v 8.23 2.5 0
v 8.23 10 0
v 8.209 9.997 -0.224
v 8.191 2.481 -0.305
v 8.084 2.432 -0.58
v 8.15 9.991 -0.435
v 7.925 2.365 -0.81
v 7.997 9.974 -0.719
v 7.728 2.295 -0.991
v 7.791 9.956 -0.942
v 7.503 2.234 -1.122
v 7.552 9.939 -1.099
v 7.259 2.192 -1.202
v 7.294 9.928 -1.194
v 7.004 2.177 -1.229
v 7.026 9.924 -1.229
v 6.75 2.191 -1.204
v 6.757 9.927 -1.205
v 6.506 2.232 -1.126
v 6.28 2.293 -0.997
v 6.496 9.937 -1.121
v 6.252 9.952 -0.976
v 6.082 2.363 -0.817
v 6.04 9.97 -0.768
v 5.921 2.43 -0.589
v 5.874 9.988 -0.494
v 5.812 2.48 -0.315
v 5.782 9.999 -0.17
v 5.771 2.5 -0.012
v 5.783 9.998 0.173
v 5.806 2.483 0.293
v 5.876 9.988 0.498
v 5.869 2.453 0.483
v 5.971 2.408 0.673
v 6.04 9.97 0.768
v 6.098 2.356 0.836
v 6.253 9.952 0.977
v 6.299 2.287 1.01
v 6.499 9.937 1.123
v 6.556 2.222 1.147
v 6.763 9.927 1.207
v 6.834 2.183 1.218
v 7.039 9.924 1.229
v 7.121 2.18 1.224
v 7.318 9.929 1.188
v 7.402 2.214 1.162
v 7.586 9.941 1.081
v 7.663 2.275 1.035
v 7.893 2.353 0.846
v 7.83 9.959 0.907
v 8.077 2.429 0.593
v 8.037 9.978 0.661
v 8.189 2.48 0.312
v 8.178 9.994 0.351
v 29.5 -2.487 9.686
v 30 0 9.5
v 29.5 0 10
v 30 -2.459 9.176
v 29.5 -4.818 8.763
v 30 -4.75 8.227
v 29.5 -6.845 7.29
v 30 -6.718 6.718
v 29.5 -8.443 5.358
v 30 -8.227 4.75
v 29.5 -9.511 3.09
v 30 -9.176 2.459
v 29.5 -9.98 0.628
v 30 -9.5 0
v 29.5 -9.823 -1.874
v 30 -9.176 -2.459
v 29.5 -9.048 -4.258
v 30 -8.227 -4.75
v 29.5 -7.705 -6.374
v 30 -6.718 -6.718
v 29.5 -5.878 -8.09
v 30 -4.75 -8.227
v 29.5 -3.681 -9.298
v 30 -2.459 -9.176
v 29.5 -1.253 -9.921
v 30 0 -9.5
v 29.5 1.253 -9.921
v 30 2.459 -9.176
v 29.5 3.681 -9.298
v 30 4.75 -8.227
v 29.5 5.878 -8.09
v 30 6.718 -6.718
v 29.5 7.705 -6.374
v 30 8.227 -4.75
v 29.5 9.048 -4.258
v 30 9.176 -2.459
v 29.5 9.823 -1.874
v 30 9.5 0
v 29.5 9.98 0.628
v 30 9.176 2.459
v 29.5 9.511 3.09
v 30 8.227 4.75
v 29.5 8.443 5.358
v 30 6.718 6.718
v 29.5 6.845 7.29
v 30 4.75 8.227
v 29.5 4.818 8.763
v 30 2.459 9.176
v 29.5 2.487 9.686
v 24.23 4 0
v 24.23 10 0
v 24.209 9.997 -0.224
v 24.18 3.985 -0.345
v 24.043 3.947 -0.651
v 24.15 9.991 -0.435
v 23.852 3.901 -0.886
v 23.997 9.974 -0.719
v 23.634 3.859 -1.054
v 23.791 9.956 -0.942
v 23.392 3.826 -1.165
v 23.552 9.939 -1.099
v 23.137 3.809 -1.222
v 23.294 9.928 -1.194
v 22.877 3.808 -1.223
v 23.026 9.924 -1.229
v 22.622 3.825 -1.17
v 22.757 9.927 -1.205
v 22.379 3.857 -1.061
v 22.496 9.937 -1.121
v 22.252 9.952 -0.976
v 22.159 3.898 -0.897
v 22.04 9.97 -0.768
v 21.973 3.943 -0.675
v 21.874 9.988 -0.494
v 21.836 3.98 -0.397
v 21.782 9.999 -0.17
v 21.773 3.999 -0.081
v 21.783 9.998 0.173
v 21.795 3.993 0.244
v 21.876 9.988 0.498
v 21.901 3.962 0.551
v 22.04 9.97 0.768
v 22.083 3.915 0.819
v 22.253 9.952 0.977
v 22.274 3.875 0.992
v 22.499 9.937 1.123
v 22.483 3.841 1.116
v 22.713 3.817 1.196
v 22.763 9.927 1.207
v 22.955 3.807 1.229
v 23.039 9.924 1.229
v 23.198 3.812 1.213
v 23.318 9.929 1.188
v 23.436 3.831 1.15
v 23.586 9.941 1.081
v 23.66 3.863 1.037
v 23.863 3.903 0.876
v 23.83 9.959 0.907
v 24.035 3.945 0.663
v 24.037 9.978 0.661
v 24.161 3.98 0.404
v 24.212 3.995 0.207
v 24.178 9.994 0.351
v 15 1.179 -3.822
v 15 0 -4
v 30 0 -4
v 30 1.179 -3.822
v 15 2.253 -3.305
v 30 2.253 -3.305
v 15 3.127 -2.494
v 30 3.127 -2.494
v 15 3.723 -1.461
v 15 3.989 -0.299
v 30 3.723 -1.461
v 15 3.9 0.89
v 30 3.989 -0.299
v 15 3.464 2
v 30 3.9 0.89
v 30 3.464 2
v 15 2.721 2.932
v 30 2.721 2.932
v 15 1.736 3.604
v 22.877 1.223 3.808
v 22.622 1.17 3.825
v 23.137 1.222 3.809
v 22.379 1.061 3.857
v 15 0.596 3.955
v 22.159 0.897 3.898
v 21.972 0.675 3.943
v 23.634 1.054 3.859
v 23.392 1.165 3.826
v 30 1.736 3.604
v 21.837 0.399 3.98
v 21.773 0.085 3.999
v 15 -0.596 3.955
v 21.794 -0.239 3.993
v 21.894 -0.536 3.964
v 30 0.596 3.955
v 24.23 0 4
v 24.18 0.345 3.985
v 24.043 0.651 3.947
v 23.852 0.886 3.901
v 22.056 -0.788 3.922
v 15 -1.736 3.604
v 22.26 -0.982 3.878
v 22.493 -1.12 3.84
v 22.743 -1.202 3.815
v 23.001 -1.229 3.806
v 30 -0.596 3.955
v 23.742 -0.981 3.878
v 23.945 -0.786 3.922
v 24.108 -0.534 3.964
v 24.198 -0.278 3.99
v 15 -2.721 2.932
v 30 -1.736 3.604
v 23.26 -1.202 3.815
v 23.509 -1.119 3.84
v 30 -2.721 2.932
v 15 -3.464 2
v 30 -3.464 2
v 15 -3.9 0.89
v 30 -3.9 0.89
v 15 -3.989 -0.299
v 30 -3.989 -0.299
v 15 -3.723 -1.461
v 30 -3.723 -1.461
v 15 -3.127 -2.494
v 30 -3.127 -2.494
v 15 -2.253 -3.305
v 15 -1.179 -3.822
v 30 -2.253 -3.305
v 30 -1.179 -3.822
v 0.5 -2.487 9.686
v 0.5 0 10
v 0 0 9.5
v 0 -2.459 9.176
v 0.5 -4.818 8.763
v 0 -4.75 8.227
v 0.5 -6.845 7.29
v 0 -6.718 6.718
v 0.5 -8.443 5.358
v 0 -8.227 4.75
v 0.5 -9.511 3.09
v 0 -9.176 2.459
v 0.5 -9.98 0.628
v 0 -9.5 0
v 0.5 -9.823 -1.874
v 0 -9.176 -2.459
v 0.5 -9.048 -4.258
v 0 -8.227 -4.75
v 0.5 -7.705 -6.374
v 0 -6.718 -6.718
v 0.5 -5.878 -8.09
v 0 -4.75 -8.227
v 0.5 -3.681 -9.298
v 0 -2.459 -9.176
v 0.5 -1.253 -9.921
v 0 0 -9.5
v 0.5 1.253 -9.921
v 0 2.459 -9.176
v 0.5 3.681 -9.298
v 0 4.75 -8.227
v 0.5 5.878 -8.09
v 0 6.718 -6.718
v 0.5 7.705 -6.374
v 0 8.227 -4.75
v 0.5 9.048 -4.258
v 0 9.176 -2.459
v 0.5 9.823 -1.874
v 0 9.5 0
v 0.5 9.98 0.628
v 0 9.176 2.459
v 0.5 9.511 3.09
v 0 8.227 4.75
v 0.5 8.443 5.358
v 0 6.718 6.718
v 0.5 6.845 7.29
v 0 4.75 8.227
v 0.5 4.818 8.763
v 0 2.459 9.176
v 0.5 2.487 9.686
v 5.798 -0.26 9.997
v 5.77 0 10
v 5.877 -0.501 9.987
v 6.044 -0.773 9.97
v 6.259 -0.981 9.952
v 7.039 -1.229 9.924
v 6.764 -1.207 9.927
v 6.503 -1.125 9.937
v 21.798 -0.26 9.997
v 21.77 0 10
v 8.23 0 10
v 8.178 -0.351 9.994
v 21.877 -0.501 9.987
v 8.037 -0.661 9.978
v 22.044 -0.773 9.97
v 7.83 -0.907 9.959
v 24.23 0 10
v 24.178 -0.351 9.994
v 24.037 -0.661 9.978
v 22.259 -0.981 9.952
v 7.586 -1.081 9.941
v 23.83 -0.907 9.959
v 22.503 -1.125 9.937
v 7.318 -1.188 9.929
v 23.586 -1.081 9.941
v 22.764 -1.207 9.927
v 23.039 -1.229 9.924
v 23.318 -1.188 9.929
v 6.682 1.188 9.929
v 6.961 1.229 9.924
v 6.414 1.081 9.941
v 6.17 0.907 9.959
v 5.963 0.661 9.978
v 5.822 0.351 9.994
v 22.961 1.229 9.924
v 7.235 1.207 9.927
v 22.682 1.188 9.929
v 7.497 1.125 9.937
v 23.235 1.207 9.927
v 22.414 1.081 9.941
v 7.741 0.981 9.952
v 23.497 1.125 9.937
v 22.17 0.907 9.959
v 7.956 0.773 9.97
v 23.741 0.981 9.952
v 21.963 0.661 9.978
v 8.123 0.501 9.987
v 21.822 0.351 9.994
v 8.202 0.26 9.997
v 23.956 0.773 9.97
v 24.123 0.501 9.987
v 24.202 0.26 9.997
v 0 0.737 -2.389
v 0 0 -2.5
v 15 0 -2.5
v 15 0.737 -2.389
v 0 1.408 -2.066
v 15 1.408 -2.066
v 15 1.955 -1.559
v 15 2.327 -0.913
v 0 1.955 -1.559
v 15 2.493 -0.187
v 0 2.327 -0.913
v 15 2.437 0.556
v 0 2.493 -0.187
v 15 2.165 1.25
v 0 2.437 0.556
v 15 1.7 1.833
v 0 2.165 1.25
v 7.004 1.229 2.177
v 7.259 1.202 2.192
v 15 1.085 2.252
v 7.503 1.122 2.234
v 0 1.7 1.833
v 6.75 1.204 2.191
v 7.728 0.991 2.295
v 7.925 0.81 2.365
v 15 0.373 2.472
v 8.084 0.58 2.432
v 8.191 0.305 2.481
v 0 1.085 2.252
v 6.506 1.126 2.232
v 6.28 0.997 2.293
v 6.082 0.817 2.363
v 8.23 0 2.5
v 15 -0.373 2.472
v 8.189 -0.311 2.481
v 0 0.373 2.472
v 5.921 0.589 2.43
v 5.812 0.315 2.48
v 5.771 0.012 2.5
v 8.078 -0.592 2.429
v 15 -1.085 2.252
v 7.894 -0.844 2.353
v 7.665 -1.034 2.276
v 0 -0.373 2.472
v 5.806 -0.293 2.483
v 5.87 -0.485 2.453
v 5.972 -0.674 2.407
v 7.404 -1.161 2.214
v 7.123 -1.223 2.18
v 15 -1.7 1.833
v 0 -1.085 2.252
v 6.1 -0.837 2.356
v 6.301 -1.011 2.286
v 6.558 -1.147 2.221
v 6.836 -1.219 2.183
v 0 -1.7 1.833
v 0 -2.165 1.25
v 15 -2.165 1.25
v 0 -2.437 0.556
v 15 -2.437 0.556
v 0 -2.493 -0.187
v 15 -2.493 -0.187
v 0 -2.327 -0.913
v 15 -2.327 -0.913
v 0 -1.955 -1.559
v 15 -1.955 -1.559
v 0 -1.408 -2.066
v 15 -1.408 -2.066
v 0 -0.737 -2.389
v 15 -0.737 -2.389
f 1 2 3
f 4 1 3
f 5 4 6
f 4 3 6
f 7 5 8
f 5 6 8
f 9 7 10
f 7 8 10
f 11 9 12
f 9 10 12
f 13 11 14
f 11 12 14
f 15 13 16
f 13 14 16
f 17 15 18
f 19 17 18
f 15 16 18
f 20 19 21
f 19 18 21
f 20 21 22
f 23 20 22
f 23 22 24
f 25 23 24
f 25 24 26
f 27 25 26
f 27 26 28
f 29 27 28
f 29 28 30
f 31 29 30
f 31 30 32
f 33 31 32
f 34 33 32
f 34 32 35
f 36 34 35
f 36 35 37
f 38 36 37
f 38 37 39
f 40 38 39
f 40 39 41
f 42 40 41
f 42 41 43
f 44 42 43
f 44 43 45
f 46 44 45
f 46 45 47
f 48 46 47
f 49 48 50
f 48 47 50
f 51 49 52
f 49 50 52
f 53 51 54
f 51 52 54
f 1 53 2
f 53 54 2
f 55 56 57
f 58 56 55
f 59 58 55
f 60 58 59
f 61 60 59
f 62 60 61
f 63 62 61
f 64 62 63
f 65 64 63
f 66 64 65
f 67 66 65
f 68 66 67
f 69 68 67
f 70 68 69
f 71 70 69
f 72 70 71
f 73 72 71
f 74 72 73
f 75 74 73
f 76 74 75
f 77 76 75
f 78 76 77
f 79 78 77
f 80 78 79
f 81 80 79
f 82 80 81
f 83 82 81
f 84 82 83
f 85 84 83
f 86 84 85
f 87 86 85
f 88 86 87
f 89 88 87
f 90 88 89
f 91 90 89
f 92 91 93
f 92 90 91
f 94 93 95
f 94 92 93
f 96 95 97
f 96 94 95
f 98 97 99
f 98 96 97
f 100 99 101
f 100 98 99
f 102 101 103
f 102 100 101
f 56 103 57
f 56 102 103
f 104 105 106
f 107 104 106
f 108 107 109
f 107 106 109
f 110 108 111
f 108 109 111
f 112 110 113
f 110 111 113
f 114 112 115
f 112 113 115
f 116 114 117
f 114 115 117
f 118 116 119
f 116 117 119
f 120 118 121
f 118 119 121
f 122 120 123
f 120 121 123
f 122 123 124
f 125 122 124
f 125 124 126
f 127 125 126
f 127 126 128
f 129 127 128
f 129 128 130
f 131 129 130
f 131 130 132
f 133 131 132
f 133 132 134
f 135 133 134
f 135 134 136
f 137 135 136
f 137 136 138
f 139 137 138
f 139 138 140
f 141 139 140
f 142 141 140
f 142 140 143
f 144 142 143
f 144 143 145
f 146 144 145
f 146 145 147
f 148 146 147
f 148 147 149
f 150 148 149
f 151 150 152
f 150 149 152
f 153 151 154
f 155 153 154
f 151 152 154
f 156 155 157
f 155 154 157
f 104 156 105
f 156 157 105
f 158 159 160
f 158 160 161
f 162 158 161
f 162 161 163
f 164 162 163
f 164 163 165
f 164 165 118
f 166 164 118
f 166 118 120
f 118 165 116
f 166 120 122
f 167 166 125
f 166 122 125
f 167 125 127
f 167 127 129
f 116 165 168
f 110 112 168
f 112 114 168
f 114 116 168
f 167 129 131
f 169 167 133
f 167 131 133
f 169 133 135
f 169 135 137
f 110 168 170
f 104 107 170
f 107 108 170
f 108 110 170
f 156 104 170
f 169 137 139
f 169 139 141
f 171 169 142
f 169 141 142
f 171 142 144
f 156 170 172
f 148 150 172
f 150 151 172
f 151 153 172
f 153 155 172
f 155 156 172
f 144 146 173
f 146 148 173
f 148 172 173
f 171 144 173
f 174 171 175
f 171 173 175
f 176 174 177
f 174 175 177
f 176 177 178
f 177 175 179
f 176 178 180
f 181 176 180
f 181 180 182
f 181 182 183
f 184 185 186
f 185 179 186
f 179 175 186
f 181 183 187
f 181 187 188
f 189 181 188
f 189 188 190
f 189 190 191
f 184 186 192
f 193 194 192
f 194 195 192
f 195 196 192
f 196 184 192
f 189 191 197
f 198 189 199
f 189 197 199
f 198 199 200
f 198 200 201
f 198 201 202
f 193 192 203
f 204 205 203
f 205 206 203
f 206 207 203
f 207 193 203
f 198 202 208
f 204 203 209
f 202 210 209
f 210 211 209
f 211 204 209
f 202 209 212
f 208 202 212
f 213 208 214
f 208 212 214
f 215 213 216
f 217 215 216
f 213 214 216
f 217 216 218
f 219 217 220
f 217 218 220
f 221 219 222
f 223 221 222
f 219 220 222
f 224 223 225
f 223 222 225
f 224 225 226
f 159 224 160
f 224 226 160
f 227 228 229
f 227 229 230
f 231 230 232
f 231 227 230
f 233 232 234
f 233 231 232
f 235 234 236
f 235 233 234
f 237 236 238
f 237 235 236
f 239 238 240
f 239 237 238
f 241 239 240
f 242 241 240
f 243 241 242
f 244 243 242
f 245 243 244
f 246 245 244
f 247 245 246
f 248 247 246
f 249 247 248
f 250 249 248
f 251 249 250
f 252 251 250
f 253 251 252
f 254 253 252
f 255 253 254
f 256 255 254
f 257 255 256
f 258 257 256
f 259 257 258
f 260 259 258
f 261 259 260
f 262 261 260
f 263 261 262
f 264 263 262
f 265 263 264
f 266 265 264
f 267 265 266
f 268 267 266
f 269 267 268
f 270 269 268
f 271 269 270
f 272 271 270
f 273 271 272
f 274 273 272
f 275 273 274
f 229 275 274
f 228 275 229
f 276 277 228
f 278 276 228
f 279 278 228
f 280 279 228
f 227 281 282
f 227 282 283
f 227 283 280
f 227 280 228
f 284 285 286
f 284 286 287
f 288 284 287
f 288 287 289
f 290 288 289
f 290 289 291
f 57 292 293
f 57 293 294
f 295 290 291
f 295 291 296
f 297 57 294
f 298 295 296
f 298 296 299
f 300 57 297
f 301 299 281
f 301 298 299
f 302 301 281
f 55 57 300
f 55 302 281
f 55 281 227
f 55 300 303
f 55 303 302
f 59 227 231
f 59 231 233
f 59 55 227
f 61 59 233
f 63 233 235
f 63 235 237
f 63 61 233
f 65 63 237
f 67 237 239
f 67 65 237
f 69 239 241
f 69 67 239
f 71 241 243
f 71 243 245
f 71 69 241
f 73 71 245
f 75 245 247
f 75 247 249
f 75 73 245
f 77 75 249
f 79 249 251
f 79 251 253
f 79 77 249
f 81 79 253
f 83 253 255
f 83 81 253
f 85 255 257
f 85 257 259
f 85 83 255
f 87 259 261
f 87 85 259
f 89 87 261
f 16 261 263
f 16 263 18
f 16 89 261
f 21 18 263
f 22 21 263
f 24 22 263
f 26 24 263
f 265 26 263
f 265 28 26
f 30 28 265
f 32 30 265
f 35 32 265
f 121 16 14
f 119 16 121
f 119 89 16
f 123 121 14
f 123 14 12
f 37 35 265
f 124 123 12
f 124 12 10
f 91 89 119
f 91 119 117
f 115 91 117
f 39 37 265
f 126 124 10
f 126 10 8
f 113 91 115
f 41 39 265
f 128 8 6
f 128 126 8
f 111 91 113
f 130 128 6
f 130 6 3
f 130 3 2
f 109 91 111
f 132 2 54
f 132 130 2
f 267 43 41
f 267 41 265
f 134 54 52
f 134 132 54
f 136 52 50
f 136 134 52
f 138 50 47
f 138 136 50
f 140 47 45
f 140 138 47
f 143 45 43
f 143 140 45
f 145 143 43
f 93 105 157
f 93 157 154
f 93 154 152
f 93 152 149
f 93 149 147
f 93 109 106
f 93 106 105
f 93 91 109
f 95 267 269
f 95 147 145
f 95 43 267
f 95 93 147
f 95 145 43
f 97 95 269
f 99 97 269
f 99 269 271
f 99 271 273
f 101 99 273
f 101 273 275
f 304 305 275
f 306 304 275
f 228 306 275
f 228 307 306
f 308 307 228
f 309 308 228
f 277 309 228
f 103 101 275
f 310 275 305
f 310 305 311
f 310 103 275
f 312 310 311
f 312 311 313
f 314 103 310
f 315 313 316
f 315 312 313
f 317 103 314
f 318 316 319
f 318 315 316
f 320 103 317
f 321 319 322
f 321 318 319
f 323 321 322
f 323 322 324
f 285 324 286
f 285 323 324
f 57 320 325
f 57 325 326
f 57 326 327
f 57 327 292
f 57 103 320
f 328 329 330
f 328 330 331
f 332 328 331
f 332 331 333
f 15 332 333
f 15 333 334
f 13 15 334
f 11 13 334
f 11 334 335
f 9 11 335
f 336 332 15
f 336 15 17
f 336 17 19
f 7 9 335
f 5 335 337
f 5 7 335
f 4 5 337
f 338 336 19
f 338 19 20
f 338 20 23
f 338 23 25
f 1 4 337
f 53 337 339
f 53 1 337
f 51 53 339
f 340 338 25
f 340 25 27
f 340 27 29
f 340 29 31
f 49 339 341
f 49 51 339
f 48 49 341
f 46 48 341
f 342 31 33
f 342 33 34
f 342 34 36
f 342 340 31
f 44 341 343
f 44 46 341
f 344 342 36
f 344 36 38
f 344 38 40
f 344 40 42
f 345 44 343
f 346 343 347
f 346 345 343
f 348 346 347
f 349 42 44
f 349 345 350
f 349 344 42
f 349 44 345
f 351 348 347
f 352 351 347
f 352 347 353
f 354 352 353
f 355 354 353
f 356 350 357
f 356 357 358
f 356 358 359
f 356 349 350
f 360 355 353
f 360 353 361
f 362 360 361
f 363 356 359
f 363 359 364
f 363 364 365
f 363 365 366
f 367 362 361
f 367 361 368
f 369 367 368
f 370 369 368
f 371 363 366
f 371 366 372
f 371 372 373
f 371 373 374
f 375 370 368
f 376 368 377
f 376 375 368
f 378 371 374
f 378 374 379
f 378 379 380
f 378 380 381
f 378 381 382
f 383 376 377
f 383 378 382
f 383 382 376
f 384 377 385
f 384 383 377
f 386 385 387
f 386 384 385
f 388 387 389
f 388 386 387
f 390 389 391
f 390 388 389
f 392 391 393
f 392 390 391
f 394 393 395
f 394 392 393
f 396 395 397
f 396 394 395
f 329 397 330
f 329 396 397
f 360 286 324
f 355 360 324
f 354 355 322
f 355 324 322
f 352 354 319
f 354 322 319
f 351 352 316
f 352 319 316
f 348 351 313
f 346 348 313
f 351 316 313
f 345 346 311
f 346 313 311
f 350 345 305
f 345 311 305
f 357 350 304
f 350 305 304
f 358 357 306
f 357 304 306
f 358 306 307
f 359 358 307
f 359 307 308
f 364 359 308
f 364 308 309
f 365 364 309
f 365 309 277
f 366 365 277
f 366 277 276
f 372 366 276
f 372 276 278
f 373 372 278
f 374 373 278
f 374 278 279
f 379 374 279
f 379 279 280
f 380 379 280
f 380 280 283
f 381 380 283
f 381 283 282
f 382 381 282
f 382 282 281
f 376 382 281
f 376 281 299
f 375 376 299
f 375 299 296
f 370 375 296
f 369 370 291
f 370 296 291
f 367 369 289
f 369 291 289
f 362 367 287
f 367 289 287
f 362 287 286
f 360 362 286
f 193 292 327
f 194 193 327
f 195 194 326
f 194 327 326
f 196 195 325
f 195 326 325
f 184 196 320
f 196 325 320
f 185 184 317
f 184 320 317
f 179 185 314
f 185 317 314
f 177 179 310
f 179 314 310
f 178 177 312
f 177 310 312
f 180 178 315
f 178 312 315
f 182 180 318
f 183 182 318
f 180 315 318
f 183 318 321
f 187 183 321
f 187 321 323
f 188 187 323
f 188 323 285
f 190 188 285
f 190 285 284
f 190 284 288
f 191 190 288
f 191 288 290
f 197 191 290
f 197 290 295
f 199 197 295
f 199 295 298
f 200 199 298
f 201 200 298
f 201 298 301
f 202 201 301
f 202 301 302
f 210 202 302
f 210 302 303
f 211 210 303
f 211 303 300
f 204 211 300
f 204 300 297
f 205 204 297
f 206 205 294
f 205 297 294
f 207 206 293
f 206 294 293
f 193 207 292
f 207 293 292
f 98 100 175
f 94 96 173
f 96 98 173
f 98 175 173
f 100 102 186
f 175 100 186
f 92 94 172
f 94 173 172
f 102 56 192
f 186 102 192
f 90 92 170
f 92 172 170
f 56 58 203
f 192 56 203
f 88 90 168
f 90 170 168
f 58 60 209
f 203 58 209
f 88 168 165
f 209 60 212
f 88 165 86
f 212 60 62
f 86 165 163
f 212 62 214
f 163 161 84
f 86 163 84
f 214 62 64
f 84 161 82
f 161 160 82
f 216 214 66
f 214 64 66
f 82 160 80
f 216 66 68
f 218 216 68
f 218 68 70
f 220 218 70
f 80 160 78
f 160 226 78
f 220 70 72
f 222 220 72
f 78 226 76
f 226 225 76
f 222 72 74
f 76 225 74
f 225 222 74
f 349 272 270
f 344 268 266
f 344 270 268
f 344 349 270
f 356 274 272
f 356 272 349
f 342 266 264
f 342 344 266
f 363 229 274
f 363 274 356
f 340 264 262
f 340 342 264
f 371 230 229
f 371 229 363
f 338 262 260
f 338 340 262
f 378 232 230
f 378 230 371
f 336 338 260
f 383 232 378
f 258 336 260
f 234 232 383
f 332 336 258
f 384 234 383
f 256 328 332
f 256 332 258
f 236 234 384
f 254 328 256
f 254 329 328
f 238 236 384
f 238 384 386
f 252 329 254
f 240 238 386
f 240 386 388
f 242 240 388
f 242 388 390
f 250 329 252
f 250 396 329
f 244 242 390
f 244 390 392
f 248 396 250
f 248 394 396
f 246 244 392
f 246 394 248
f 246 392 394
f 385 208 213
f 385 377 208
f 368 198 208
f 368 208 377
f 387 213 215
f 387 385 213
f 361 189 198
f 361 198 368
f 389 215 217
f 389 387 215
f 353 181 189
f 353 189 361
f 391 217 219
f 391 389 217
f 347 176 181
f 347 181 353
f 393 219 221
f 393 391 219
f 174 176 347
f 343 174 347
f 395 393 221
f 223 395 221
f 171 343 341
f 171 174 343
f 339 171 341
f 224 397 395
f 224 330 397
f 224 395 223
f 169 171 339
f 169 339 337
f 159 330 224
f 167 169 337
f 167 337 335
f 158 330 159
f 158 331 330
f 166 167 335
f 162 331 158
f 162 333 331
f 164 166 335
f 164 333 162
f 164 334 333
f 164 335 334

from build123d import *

# Parameters (mm, degrees)
SKETCH1_W          = 30
SKETCH1_H          = 10
SKETCH2_R          = 2.5
CUT_EXTRUDE1_DEPTH = 15
SKETCH3_R          = 4
CUT_EXTRUDE2_DEPTH = 15
TAP1_REACH         = 39.417
TAP1_BORE_R        = 1.2295
TAP2_REACH         = 39.417
TAP2_BORE_R        = 1.2295
CHAMFER1_SIZE      = 0.5


with BuildPart() as part:
    # Sketch1 → Revolve1 (revolve)
    with BuildSketch(Plane.XY, mode=Mode.PRIVATE) as revolve1_sk:
        with Locations((15, 5)):
            Rectangle(SKETCH1_W, SKETCH1_H)
    revolve(revolve1_sk.sketch.rotate(Axis((0, 0, 0), (1, 0, 0)), 90), axis=Axis((0, 0, 0), (1, 0, 0)))

    # Sketch2 → Cut-Extrude1 (cut)
    with BuildSketch(Plane(origin=(0, 0, 0), x_dir=(0, 0, -1), z_dir=(1, 0, 0))):
        Circle(SKETCH2_R)
    extrude(amount=CUT_EXTRUDE1_DEPTH, mode=Mode.SUBTRACT)

    # Sketch3 → Cut-Extrude2 (cut)
    with BuildSketch(Plane(origin=(30, 0, 0), x_dir=(0, 0, -1), z_dir=(1, 0, 0))):
        Circle(SKETCH3_R)
    extrude(amount=-CUT_EXTRUDE2_DEPTH, mode=Mode.SUBTRACT)

    # Tap1 bore → Tap1 (cut, up to next)
    with BuildSketch(Plane.XY.offset(10), mode=Mode.PRIVATE) as tap1_sk1:
        with Locations((7, 0)):
            Circle(TAP1_BORE_R)
    tap1_tool1 = extrude(tap1_sk1.sketch, amount=-TAP1_REACH, mode=Mode.PRIVATE) & part.part
    # Tap1 bore → Tap1 (cut, up to next)
    with BuildSketch(Plane.XY.offset(10), mode=Mode.PRIVATE) as tap1_sk2:
        with Locations((23, 0)):
            Circle(TAP1_BORE_R)
    tap1_tool2 = extrude(tap1_sk2.sketch, amount=-TAP1_REACH, mode=Mode.PRIVATE) & part.part
    add(tap1_tool1.solids().sort_by_distance((7, 0, 10))[0], mode=Mode.SUBTRACT)
    add(tap1_tool2.solids().sort_by_distance((23, 0, 10))[0], mode=Mode.SUBTRACT)

    # Tap2 bore → Tap2 (cut, up to next)
    with BuildSketch(Plane(origin=(0, 10, 0), x_dir=(1, 0, 0), z_dir=(0, 1, 0)), mode=Mode.PRIVATE) as tap2_sk1:
        with Locations((7, 0)):
            Circle(TAP2_BORE_R)
    tap2_tool1 = extrude(tap2_sk1.sketch, amount=-TAP2_REACH, mode=Mode.PRIVATE) & part.part
    # Tap2 bore → Tap2 (cut, up to next)
    with BuildSketch(Plane(origin=(0, 10, 0), x_dir=(1, 0, 0), z_dir=(0, 1, 0)), mode=Mode.PRIVATE) as tap2_sk2:
        with Locations((23, 0)):
            Circle(TAP2_BORE_R)
    tap2_tool2 = extrude(tap2_sk2.sketch, amount=-TAP2_REACH, mode=Mode.PRIVATE) & part.part
    add(tap2_tool1.solids().sort_by_distance((7, 10, 0))[0], mode=Mode.SUBTRACT)
    add(tap2_tool2.solids().sort_by_distance((23, 10, 0))[0], mode=Mode.SUBTRACT)

    # Chamfer1
    chamfer1_edges = [part.edges().sort_by_distance(p)[0] for p in [
        (30, 0, -10),
        (0, 0, -10),
    ]]
    chamfer(chamfer1_edges, length=CHAMFER1_SIZE)


solid = part.part
